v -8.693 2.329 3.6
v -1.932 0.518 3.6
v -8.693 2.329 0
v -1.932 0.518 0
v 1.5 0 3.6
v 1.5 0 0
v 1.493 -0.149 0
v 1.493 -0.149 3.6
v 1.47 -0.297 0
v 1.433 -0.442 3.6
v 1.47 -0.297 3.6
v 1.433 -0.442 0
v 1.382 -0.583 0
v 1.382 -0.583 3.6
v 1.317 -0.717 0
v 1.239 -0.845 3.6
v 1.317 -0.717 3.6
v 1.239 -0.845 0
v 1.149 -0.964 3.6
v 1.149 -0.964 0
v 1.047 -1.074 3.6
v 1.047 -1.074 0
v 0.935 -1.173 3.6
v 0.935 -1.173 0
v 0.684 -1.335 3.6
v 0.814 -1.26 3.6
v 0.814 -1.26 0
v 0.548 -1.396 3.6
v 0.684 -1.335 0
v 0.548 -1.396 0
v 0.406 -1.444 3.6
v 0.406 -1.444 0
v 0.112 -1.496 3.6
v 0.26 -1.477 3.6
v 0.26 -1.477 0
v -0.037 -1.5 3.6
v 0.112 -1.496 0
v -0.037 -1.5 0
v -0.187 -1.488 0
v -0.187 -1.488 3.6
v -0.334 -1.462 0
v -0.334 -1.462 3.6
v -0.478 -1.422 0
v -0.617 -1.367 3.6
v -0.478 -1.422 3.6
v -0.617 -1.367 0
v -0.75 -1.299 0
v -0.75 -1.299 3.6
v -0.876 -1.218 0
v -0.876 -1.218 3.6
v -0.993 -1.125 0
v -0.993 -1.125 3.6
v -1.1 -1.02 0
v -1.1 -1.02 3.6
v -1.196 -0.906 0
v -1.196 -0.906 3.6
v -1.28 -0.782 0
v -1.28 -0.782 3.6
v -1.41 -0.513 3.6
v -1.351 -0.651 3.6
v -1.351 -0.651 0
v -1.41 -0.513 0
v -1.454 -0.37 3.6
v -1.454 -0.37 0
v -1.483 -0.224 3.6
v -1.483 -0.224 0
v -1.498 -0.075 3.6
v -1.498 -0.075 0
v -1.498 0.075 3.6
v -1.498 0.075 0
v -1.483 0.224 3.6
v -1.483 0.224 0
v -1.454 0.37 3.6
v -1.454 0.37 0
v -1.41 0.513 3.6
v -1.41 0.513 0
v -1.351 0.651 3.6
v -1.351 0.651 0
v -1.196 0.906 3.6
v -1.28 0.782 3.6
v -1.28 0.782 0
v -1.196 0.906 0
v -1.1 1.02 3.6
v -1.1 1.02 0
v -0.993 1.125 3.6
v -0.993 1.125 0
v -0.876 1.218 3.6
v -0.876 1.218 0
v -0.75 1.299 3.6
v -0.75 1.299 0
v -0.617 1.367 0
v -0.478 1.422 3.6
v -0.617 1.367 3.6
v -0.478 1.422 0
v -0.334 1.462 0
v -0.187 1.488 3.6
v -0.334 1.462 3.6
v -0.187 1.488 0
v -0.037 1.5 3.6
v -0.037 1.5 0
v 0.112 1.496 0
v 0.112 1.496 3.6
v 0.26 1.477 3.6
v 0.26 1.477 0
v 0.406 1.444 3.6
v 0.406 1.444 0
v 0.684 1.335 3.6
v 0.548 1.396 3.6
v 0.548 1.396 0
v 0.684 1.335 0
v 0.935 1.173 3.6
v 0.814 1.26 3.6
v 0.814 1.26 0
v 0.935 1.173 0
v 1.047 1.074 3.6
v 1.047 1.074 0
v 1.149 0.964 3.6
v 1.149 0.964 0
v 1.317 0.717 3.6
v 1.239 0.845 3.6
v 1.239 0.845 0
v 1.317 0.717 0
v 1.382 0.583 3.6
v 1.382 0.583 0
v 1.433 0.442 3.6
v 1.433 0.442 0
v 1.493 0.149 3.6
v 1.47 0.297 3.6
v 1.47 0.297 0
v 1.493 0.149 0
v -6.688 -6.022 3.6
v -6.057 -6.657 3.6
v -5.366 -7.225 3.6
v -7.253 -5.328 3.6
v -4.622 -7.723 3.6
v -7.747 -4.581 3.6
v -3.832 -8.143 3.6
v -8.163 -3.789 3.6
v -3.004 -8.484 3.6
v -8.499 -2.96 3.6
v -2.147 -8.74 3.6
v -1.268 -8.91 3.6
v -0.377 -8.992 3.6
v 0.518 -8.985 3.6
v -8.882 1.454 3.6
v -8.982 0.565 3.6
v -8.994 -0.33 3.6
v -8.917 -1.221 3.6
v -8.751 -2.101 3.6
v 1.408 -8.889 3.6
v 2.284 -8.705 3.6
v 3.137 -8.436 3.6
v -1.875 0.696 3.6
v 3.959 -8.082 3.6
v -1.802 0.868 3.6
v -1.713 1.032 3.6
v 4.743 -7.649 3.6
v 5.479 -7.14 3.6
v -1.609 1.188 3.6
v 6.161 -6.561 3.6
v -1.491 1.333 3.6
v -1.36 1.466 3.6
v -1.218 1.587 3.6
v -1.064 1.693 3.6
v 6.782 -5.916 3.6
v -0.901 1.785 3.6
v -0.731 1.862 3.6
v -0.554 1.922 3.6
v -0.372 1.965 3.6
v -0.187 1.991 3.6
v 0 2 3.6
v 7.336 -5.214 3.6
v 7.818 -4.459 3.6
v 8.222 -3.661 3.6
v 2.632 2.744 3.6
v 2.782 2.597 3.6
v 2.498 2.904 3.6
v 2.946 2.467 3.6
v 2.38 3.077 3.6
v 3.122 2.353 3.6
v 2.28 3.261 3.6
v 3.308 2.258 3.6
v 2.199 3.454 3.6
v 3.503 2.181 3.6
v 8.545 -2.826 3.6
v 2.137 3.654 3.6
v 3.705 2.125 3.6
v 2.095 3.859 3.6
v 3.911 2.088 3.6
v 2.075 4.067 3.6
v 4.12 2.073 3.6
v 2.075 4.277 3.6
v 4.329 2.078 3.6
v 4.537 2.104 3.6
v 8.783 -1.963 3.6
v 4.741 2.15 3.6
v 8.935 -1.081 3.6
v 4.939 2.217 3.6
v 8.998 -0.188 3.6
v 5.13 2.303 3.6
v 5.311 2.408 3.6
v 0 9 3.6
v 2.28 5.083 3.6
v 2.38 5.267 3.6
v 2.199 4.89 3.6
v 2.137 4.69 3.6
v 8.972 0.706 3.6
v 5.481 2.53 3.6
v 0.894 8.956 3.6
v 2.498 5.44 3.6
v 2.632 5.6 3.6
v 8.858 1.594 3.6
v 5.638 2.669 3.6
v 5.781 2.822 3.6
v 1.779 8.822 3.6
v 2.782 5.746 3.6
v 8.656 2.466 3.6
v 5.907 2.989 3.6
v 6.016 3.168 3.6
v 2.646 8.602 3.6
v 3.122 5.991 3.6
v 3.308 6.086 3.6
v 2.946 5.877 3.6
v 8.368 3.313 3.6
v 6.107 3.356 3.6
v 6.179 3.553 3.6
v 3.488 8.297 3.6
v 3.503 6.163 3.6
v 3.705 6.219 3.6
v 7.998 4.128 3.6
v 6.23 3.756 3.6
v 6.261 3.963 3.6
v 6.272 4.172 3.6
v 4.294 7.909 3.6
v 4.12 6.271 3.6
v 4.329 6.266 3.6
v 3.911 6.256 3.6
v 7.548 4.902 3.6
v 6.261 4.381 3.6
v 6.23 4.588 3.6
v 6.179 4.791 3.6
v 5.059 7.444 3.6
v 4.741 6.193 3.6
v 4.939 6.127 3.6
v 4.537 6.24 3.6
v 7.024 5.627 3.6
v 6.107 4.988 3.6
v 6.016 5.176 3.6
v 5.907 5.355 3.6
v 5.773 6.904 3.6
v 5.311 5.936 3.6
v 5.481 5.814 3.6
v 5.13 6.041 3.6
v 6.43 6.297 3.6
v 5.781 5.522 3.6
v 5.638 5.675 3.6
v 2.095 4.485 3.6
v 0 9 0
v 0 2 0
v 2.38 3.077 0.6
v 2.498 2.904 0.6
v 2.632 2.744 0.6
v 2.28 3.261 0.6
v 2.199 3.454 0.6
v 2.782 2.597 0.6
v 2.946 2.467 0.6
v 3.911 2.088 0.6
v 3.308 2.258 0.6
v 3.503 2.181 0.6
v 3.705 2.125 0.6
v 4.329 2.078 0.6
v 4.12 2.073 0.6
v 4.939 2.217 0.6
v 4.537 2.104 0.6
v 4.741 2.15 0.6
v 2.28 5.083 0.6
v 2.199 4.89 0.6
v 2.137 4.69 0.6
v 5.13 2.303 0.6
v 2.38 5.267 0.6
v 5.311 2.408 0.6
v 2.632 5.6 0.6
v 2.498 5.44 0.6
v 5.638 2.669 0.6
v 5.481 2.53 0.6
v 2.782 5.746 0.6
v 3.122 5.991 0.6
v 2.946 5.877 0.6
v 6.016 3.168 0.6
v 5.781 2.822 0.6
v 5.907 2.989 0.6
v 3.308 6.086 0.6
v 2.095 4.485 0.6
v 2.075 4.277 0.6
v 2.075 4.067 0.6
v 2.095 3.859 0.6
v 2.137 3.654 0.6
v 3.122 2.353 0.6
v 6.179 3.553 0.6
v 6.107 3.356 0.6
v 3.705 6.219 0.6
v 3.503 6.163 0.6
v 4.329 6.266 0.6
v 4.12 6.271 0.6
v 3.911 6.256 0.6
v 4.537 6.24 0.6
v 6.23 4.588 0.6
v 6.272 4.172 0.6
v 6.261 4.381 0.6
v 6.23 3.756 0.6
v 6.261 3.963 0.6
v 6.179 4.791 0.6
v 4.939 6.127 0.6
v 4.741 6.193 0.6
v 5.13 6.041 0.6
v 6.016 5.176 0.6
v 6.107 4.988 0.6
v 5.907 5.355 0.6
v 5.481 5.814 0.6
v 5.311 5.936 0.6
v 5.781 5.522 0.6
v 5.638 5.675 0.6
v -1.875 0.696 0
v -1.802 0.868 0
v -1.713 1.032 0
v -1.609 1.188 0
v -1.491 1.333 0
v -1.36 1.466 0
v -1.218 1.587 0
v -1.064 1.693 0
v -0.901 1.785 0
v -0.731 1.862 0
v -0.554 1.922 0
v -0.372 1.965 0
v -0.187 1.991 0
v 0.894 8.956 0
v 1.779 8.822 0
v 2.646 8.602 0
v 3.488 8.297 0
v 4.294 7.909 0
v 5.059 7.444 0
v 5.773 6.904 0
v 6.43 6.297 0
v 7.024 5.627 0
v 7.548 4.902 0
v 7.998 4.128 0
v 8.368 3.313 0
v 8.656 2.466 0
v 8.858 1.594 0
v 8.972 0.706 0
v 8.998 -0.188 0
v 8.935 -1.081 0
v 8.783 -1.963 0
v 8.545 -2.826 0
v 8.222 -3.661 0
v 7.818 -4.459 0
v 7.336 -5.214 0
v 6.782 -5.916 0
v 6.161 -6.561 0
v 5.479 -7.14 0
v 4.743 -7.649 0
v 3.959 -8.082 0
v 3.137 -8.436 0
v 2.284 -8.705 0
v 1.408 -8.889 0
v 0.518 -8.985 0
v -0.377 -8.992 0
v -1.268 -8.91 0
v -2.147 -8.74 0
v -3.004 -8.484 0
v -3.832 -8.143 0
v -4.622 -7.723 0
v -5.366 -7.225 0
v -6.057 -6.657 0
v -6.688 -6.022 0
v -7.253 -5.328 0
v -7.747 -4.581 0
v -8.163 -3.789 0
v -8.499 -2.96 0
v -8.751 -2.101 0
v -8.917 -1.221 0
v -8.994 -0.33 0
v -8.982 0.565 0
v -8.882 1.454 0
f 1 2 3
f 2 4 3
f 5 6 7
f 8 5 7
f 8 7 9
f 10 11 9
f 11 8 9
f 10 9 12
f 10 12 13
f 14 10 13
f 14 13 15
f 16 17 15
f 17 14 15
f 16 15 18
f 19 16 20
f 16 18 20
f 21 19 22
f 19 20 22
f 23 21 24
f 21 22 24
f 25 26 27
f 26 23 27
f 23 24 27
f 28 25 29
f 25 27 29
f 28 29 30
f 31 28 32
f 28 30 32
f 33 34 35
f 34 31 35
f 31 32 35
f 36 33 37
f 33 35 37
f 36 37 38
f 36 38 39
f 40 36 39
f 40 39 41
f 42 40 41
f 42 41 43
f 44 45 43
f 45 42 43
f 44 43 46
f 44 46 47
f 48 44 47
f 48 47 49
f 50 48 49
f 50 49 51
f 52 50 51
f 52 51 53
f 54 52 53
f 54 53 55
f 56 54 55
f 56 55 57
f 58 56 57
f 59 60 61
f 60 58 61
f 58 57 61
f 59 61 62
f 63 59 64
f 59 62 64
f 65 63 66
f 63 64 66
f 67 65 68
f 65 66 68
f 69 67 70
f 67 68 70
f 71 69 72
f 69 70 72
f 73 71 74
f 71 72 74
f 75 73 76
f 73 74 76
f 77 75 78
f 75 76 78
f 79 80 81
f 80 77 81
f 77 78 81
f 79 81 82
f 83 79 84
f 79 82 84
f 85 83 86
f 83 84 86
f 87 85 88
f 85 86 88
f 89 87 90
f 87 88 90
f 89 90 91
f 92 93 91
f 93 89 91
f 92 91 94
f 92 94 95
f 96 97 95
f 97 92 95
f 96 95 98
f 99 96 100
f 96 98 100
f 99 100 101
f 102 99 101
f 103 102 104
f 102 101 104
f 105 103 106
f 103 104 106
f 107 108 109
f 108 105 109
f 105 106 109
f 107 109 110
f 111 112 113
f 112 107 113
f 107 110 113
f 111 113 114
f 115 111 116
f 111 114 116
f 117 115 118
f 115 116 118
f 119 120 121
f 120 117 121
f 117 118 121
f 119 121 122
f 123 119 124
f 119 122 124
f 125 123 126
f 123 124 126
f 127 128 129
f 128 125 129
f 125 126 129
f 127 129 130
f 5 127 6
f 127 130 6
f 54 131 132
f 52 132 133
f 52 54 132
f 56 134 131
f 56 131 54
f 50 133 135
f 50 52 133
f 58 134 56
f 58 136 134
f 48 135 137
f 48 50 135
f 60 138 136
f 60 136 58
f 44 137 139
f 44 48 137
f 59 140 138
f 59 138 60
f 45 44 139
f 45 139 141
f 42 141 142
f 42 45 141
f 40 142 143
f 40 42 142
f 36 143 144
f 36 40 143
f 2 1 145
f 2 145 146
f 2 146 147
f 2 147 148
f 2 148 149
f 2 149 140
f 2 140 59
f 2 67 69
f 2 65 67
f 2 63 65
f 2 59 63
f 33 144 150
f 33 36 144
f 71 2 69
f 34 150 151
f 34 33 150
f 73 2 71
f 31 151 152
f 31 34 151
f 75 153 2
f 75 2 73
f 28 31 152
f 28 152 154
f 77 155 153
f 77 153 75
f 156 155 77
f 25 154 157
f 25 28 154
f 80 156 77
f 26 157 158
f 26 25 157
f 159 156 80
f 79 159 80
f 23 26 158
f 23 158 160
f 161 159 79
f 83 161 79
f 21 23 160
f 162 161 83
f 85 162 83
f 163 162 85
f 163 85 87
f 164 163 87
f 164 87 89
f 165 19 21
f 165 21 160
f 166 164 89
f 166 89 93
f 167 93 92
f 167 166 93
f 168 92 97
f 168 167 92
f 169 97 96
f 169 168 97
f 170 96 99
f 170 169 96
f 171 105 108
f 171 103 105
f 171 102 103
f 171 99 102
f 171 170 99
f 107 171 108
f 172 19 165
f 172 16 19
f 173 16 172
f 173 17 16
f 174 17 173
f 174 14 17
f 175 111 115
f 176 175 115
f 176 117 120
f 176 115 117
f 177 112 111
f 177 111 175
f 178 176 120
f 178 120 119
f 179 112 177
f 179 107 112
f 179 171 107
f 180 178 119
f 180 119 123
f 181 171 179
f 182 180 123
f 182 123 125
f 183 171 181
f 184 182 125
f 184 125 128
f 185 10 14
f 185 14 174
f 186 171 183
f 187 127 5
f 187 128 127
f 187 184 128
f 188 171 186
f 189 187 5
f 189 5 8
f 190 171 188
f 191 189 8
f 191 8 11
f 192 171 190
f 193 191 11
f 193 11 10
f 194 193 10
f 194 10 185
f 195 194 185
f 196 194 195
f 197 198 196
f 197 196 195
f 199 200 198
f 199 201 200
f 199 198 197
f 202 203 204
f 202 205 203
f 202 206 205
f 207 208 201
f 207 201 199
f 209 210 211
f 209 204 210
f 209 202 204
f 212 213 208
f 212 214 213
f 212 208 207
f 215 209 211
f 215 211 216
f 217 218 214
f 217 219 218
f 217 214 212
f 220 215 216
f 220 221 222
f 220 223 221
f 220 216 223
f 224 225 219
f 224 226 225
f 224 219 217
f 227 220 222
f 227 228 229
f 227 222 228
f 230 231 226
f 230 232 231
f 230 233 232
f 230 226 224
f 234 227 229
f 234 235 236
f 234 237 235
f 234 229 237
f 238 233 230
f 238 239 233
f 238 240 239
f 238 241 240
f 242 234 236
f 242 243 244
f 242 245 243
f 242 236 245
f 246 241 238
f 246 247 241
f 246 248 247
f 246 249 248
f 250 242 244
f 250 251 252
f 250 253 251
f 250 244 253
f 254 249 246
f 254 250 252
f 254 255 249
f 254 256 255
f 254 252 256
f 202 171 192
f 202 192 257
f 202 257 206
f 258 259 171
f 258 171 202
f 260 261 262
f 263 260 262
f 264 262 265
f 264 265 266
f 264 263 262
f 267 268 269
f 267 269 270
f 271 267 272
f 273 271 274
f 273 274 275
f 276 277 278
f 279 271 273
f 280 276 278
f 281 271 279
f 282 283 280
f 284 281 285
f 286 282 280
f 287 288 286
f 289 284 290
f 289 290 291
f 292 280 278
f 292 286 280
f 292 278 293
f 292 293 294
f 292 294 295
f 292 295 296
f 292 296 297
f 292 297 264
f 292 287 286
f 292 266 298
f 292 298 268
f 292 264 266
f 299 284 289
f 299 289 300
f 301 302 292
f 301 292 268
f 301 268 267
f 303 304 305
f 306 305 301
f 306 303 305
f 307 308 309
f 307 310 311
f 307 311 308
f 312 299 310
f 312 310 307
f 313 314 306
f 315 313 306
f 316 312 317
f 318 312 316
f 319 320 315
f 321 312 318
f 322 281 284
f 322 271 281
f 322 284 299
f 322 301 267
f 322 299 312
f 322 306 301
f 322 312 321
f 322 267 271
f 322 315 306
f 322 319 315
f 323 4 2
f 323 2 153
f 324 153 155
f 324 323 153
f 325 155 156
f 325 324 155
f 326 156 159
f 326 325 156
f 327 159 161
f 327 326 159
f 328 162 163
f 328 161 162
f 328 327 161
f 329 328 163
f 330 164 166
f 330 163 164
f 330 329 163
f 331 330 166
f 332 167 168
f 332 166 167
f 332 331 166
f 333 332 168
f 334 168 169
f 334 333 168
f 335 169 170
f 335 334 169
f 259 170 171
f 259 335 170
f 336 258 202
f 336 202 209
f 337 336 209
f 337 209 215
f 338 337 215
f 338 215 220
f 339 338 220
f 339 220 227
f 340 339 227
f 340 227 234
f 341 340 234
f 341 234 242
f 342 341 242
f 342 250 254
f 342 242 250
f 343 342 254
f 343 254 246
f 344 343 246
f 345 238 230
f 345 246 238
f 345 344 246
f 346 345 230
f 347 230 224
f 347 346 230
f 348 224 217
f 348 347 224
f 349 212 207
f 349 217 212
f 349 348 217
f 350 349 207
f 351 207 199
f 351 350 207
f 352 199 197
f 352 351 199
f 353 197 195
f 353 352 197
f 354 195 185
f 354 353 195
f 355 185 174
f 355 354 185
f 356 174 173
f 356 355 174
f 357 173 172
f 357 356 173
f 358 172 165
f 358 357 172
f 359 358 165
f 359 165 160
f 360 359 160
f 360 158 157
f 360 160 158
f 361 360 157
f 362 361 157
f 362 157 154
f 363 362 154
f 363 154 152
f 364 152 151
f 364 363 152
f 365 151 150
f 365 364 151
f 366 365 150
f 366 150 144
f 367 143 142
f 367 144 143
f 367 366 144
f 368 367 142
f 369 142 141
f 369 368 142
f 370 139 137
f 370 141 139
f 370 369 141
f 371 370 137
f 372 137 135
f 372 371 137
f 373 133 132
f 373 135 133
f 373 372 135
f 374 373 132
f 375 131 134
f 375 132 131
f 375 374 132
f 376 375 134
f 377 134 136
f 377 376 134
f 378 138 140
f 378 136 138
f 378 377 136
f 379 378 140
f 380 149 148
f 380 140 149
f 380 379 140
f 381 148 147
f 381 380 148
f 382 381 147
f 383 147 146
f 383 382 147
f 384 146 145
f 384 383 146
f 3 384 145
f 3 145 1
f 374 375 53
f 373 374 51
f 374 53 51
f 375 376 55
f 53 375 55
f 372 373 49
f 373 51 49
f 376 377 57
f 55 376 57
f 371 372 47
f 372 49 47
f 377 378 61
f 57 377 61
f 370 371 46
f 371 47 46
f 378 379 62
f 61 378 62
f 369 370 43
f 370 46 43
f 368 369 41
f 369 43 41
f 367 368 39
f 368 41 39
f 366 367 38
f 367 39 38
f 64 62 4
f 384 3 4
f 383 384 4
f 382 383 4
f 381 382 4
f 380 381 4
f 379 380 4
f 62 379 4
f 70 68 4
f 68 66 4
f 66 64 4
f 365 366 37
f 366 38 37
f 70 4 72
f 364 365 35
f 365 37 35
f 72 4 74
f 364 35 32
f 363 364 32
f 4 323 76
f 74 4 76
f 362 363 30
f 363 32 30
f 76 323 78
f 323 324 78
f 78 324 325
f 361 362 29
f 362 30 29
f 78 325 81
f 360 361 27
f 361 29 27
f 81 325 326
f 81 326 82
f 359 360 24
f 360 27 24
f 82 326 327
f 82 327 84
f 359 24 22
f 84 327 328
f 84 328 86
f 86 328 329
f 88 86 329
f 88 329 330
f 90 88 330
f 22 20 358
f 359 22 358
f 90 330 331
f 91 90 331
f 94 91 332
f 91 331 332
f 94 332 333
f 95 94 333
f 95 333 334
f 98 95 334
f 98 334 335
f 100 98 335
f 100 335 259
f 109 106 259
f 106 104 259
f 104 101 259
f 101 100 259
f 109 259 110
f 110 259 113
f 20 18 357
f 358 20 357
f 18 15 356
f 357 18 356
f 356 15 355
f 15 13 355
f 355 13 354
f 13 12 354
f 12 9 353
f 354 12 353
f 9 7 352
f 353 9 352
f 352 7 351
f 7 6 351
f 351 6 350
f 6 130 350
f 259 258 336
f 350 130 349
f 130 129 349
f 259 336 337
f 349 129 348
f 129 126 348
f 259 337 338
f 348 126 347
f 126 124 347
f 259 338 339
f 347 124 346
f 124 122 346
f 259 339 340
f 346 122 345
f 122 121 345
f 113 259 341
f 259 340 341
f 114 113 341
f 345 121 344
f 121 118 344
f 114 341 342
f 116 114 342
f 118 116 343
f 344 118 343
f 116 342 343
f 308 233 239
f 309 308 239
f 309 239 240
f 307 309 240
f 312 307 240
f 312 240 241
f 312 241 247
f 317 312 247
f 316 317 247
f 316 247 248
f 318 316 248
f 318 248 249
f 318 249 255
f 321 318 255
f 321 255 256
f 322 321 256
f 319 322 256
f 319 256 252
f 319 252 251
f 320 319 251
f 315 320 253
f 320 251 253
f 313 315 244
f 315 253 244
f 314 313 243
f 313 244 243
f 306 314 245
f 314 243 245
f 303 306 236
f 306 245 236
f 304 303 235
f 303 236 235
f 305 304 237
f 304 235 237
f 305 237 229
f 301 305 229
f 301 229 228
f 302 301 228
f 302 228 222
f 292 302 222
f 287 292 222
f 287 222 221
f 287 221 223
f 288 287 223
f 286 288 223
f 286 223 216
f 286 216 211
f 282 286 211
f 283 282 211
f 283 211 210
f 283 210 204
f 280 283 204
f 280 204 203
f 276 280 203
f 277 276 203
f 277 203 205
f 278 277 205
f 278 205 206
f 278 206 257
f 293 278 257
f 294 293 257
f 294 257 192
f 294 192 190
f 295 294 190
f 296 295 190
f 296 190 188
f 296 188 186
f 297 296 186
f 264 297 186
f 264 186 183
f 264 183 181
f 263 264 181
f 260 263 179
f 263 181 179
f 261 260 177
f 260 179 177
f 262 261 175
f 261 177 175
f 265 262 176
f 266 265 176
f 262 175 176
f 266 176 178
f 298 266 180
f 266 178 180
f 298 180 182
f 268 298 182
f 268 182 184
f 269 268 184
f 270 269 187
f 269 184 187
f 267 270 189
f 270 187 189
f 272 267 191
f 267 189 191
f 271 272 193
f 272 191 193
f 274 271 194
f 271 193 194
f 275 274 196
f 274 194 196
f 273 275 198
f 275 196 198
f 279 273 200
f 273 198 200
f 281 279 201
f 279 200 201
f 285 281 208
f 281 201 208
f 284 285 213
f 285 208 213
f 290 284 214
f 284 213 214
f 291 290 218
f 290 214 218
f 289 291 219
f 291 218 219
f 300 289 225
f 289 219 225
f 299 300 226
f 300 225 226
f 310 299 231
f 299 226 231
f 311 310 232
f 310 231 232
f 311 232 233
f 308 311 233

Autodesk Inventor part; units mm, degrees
ref_plane "YZ Plane" through (0, 0, 0) normal (1, 0, 0) x (0, 1, 0)
ref_plane "XZ Plane" through (0, 0, 0) normal (0, 1, 0) x (-1, 0, 0)
ref_plane "XY Plane" through (0, 0, 0) normal (0, 0, 1) x (1, 0, 0)
sketch "Sketch1" plane through (0, 0, 0) normal (0, 0, 1) x (1, 0, 0)
  circle A0 centre (0, 0) radius 1.5
  arc A1 (-8.6933, 2.3294) -> (0, 9) centre (0, 0) ccw
  line L0 (0, 2) -> (0, 9)
  line L1 (-1.9319, 0.5176) -> (-8.6933, 2.3294)
  arc A2 (0, 2) -> (-1.9319, 0.5176) centre (0, 0) ccw
extrude "Extrusion1" add sketch "Sketch1" along normal blind 3.6
sketch "Sketch2" plane through (0, 0, 3.6) normal (0, 0, 1) x (1, 0, 0)
  circle A0 centre (4.1719, 4.1719) radius 2.1
extrude "Extrusion2" cut sketch "Sketch2" against normal blind 3
properties part number "cam"
